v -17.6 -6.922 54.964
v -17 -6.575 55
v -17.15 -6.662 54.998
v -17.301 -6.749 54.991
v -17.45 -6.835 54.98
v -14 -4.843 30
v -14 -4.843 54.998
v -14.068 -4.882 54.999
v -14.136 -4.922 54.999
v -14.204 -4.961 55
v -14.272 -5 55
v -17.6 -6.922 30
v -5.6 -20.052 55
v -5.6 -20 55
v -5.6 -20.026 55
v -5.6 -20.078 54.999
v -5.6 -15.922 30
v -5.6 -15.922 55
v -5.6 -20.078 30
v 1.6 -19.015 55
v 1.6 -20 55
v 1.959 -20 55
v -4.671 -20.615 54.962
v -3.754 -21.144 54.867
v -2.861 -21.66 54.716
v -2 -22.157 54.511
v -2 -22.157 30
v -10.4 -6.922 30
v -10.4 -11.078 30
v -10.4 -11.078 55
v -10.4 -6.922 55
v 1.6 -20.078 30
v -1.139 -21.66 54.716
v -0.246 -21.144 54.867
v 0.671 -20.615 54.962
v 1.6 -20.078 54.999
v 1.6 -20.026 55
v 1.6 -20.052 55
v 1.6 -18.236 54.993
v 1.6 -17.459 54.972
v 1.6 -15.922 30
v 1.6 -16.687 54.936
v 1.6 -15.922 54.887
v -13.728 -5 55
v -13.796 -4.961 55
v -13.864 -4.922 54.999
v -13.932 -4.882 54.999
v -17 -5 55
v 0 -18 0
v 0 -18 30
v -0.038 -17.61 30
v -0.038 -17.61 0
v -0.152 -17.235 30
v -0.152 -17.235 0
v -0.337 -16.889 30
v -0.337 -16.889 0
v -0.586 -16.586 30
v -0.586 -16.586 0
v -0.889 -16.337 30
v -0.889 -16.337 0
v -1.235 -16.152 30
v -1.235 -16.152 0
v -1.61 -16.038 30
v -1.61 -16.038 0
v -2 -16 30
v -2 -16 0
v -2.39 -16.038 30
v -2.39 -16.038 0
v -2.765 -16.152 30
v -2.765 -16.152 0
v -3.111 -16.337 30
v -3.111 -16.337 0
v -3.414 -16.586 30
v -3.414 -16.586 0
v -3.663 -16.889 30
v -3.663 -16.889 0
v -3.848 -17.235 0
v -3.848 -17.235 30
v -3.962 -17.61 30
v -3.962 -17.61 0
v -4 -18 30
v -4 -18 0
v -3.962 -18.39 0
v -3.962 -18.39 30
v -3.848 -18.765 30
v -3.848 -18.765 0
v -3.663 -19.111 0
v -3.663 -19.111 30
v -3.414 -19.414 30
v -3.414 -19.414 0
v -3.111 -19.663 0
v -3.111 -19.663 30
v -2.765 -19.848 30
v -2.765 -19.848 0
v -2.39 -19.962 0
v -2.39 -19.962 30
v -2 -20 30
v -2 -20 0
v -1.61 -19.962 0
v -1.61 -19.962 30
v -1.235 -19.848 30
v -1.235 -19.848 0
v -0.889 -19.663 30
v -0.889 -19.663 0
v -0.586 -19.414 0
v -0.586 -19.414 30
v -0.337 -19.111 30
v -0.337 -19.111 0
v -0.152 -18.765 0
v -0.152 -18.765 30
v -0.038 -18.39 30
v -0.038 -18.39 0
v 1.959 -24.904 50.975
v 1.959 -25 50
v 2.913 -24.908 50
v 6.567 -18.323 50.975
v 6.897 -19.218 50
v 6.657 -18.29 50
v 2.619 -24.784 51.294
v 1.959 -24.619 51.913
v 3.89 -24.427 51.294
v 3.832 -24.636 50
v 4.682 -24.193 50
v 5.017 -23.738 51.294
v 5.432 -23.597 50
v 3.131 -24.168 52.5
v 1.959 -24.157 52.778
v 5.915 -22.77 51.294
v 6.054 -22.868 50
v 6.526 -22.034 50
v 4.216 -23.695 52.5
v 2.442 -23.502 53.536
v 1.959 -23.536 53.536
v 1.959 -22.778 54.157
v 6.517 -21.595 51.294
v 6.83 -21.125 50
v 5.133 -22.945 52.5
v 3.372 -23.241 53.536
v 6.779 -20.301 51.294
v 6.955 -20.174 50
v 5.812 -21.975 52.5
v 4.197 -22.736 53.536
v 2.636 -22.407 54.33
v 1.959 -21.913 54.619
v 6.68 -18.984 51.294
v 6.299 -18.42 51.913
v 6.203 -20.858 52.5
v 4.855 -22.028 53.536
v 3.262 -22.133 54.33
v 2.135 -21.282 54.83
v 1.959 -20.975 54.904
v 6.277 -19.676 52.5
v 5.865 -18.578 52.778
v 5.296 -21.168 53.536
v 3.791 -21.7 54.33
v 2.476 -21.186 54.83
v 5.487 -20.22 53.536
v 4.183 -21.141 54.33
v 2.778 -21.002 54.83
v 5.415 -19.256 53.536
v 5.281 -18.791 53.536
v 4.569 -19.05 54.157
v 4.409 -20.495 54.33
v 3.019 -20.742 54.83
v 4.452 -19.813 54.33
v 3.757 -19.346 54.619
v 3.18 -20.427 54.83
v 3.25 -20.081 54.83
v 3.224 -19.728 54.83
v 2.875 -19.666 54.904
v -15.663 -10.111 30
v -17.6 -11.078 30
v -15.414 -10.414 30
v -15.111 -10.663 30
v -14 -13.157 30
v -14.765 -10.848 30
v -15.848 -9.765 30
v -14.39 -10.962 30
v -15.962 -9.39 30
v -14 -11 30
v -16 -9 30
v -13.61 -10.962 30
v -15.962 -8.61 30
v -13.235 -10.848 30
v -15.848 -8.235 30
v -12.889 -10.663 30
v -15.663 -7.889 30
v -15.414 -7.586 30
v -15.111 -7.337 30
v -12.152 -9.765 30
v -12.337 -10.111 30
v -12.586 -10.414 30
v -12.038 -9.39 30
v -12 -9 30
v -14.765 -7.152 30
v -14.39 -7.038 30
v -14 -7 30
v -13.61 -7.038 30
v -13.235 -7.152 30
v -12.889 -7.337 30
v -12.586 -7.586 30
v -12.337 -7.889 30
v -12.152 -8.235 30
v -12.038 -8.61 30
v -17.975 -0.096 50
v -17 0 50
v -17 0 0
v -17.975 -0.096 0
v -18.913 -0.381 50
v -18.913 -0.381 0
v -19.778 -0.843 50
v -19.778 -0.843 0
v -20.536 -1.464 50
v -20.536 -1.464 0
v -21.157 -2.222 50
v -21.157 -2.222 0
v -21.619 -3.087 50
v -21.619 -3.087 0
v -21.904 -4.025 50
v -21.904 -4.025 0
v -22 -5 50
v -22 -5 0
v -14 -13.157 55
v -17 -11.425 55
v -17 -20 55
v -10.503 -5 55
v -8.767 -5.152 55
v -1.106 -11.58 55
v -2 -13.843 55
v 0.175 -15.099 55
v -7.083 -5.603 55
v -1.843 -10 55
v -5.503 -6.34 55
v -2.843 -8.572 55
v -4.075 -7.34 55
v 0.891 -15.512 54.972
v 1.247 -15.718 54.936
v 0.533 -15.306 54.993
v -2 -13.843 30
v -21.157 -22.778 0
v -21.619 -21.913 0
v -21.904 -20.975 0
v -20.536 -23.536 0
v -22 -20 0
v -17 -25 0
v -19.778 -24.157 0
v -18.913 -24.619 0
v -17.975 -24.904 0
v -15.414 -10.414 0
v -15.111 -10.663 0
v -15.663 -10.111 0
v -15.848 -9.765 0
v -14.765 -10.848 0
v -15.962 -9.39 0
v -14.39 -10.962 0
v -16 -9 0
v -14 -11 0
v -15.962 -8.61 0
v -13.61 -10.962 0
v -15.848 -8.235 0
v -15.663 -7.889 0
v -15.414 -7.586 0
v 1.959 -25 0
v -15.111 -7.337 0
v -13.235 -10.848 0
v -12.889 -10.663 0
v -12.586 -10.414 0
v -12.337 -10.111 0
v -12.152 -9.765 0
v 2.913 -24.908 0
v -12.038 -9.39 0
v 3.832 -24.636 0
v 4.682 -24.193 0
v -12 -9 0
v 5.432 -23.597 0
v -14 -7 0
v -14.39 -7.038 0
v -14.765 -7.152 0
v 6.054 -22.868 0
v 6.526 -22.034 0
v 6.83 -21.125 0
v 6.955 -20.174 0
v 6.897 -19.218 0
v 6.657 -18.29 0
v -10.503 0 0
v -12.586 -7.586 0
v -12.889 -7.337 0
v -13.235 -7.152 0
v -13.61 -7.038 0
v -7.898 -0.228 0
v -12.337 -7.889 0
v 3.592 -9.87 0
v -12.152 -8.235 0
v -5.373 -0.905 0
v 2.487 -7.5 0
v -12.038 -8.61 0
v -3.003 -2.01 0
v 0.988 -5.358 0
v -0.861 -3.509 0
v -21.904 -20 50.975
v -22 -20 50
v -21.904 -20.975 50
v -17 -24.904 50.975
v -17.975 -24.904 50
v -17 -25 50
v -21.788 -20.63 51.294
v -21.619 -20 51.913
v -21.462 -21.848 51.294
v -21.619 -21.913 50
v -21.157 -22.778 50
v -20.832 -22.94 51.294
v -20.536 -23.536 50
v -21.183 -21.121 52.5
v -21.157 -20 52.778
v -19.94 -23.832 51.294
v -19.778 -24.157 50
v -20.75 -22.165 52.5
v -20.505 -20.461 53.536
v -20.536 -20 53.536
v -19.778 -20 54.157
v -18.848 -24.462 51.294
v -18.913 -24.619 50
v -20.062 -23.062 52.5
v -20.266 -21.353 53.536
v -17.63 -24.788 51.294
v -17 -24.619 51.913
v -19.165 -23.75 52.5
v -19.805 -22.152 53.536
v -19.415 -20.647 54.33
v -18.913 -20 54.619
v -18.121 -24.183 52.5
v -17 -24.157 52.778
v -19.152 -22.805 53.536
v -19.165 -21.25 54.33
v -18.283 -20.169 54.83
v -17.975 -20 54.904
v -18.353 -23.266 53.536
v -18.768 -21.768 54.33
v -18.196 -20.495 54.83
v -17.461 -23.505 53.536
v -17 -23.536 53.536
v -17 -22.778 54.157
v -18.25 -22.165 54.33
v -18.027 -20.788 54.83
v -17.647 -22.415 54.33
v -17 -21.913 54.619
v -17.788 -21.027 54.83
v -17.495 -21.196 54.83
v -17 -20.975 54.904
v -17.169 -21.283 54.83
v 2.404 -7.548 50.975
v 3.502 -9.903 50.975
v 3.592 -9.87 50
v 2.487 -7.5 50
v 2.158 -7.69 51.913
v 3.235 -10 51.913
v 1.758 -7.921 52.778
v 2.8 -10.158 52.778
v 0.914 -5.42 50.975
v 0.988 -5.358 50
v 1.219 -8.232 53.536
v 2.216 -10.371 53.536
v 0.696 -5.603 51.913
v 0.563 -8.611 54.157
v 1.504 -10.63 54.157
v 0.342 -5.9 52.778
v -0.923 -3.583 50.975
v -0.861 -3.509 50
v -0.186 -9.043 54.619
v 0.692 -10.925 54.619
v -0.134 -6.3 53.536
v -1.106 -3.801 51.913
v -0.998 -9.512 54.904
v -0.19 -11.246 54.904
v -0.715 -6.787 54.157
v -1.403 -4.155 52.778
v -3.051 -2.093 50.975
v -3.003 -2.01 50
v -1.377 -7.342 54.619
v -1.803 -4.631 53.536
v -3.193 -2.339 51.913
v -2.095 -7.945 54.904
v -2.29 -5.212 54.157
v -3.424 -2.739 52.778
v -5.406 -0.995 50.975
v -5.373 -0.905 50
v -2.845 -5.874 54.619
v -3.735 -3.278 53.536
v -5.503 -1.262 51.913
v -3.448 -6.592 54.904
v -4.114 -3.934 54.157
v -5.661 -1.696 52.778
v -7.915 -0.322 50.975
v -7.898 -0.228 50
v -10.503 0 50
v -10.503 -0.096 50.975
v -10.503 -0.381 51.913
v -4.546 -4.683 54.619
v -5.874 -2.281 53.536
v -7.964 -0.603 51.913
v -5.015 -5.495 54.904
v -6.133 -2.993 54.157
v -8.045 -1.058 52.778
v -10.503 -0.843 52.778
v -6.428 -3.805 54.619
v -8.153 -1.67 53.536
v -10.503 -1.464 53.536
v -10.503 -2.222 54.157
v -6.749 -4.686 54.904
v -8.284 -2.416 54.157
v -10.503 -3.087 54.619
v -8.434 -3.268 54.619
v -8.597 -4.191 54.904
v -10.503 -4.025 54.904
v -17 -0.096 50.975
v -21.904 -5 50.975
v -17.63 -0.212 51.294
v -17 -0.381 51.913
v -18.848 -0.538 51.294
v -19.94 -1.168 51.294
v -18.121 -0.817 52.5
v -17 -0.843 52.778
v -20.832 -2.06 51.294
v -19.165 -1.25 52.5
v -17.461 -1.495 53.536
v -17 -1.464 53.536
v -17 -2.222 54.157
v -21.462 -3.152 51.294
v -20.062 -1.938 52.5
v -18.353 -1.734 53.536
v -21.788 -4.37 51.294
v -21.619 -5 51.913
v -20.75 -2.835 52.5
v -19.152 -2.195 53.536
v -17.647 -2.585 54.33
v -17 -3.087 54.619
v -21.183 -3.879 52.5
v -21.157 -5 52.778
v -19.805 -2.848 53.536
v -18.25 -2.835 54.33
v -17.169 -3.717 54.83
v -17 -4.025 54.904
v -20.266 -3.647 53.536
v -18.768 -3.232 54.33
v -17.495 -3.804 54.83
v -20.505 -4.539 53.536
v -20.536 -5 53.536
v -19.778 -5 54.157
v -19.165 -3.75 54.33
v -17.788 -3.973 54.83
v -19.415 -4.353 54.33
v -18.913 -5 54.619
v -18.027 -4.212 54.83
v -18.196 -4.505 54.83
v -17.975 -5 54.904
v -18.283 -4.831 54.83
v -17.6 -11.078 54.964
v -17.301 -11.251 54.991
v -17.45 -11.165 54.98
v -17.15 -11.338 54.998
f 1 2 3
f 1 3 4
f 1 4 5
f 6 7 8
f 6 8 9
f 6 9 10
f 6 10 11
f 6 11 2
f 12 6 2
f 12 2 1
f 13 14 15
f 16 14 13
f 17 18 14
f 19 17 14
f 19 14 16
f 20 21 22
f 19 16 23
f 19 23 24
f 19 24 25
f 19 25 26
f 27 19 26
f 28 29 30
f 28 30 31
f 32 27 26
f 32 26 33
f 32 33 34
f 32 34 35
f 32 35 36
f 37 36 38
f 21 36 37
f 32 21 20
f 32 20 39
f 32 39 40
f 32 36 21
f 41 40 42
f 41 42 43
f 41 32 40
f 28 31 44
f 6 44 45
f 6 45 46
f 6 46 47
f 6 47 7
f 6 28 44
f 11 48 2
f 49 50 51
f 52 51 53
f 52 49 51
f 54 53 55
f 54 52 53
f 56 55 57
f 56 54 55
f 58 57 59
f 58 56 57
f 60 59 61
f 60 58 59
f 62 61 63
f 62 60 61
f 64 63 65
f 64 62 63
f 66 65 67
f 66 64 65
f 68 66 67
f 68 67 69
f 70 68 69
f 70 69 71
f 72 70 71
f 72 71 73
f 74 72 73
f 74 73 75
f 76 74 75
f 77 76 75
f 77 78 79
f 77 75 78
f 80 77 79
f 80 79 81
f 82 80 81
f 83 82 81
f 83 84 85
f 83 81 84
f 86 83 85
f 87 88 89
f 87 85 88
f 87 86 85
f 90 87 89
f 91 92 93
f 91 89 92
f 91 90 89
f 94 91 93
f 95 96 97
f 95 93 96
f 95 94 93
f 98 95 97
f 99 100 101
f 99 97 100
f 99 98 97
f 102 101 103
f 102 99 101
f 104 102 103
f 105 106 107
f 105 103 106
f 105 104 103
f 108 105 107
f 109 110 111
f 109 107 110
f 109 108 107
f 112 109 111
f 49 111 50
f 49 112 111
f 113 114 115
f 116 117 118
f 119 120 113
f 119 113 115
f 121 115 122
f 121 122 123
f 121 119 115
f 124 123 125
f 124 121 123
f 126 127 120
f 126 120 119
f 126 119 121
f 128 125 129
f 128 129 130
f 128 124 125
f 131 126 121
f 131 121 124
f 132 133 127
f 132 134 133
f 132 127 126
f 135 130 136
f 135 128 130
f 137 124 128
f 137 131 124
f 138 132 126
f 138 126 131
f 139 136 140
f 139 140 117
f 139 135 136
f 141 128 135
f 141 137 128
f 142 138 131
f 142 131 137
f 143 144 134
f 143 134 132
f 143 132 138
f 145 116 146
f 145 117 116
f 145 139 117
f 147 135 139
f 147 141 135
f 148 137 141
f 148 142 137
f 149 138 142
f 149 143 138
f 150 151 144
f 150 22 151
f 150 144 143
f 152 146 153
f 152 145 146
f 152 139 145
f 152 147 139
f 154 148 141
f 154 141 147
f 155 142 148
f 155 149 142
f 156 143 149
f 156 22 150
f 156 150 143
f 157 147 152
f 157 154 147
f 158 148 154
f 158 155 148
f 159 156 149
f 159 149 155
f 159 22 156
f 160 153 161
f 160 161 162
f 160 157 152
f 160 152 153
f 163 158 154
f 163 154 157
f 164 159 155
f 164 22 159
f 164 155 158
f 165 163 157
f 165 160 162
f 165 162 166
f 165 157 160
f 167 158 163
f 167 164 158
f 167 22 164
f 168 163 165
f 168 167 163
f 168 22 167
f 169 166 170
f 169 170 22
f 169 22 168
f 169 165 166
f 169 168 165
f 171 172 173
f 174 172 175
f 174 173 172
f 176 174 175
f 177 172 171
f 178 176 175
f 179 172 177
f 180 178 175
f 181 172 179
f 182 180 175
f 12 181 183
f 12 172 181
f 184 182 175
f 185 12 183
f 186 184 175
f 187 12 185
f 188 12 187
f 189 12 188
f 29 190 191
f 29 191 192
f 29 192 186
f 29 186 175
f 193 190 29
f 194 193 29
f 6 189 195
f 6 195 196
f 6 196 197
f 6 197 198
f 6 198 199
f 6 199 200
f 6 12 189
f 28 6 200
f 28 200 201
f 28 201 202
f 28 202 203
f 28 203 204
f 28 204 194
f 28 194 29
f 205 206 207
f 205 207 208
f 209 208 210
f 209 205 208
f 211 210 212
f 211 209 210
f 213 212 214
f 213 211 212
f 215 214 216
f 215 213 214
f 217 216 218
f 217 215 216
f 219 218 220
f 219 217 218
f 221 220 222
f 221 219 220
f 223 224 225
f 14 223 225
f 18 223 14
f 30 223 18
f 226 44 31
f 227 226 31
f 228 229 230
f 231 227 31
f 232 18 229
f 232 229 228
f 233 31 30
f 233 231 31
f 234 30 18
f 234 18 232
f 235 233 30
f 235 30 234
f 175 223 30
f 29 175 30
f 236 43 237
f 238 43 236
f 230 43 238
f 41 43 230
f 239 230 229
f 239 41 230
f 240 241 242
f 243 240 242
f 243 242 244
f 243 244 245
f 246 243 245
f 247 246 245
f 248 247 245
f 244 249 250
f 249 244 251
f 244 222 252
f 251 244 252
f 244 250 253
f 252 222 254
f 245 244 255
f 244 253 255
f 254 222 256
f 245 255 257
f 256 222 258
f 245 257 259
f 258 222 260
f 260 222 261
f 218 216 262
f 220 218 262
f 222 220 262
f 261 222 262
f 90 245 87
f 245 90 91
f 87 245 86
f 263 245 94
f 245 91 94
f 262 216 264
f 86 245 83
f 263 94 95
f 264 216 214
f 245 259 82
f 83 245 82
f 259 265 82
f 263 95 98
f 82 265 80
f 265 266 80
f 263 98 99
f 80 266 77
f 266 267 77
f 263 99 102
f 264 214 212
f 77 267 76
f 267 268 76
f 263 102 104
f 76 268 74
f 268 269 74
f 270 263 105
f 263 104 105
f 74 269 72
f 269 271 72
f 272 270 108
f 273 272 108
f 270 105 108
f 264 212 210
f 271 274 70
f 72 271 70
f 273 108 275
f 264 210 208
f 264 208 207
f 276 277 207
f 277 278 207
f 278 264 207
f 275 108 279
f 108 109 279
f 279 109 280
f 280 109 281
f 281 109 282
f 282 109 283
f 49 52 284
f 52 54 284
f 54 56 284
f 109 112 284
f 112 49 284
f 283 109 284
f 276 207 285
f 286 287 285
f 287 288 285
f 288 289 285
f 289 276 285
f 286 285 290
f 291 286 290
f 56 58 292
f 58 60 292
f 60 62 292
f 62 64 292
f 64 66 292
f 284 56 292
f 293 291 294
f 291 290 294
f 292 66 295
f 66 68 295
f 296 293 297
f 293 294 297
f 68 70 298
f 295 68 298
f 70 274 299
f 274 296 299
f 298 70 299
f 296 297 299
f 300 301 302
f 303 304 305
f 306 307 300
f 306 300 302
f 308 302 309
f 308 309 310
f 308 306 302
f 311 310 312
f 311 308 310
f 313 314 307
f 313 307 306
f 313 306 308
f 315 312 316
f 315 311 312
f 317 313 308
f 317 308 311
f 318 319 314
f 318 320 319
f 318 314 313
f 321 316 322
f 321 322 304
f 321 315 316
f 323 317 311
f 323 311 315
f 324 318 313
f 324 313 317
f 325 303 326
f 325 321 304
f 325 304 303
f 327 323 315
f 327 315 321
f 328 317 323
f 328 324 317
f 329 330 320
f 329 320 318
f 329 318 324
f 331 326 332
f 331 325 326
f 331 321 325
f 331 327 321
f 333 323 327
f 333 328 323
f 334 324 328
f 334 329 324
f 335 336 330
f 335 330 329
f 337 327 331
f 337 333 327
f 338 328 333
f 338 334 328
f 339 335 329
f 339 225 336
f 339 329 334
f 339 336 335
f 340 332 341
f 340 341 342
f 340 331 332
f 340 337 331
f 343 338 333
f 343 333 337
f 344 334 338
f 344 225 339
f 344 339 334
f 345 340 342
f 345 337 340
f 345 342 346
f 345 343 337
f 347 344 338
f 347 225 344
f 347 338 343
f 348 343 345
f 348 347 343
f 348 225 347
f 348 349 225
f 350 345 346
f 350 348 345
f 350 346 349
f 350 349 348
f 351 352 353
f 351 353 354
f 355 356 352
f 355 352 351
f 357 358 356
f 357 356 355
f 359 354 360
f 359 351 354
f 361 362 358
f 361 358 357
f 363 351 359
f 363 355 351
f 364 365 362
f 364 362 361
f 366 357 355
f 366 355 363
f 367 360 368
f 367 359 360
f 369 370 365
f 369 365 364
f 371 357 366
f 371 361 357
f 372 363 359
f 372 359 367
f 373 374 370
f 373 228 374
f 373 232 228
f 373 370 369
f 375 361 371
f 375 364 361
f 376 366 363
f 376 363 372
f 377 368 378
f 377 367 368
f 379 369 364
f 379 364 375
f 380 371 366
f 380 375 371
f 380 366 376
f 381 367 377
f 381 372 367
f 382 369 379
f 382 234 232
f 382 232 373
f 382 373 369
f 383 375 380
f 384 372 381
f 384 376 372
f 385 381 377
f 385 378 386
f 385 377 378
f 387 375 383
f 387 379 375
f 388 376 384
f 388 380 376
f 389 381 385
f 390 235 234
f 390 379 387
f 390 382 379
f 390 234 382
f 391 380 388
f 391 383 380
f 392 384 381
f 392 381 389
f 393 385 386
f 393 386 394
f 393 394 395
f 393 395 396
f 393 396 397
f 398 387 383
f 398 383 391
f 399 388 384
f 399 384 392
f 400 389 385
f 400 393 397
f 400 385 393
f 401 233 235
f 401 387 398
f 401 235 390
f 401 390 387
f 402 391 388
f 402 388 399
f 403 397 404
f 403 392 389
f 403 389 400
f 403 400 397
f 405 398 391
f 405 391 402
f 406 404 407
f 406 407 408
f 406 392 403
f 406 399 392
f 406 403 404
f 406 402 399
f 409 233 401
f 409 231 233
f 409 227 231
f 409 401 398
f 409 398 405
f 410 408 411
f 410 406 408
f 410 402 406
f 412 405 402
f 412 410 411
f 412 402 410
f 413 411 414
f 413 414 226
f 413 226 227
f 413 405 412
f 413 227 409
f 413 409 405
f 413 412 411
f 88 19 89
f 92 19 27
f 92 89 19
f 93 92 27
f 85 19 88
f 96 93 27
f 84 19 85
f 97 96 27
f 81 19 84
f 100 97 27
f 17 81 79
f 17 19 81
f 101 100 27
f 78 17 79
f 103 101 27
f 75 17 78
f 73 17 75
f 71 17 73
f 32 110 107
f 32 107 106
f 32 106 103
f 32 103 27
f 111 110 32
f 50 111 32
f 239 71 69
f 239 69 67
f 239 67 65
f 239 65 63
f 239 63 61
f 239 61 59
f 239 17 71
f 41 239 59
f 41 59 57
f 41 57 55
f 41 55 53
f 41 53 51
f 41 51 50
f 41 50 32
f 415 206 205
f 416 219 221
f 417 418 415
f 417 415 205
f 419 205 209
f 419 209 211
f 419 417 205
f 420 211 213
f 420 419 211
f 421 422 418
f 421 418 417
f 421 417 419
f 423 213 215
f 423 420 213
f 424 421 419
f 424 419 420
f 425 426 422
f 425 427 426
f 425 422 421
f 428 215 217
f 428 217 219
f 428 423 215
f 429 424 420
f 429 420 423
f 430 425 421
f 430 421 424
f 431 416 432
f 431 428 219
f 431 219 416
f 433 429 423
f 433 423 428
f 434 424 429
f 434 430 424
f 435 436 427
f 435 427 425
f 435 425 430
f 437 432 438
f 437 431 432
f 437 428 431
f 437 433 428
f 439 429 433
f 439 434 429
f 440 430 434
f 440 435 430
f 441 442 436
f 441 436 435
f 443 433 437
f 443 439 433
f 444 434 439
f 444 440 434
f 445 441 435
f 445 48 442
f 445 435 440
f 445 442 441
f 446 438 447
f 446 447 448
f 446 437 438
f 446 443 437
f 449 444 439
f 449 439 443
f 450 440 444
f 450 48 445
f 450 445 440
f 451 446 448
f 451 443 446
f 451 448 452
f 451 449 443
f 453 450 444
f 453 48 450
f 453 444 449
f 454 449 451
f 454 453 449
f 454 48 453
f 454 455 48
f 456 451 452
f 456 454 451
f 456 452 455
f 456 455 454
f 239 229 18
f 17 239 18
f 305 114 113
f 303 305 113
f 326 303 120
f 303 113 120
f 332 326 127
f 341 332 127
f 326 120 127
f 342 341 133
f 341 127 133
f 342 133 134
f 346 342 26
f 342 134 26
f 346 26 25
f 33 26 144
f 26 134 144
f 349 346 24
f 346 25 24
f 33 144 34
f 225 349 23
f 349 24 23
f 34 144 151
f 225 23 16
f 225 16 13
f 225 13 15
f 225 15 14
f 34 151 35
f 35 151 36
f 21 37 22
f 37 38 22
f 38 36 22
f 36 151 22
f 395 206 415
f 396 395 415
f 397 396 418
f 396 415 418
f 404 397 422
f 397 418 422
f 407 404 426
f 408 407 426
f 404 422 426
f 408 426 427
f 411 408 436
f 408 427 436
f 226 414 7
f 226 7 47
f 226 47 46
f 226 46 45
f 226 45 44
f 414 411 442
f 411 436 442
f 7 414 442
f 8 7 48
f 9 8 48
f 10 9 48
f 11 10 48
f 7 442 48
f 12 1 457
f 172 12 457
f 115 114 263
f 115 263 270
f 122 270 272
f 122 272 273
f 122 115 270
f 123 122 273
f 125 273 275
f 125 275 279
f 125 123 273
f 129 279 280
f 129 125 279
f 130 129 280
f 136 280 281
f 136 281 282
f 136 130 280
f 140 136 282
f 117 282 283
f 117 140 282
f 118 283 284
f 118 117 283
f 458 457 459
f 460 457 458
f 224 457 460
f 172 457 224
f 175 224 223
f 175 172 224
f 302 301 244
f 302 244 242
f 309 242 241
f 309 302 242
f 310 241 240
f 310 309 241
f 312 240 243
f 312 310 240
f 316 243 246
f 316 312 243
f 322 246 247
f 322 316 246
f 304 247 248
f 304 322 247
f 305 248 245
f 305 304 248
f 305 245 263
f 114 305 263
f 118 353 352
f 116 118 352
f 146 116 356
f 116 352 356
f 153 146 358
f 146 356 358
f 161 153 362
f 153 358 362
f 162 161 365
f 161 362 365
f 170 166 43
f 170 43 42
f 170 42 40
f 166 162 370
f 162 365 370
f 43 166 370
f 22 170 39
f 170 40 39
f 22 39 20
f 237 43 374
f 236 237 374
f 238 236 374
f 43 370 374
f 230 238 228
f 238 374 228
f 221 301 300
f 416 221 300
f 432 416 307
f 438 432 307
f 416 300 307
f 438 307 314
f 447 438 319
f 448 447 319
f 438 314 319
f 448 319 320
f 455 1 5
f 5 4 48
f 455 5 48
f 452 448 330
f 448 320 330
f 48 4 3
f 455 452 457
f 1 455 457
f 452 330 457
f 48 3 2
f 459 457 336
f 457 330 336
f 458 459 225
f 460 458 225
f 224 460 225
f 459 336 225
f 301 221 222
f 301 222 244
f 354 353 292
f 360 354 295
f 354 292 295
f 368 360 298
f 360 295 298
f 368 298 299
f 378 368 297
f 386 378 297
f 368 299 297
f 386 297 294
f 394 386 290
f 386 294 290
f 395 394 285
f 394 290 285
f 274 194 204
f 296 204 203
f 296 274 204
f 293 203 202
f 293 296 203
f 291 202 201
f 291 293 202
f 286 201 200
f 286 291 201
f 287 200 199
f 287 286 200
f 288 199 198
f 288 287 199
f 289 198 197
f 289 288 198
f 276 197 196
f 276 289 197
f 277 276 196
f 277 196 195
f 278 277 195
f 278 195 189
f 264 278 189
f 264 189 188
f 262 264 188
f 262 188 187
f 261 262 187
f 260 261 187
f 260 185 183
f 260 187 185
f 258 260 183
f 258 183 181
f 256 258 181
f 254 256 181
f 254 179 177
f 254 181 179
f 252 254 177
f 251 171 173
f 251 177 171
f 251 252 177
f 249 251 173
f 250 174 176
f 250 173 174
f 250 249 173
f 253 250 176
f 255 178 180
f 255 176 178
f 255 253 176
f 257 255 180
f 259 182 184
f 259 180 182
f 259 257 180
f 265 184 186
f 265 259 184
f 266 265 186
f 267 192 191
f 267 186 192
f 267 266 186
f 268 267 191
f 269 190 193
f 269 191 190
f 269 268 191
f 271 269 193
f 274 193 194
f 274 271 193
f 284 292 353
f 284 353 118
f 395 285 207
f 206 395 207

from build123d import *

# Parameters (mm, degrees)
PAD_DEPTH     = 55
FILLET_R      = 5
FILLET001_R   = 5
SKETCH004_R   = 2
HOLE001_DEPTH = 55.001
POCKET_START  = 30
POCKET_DEPTH  = 70


with BuildPart() as part:
    # Sketch → Pad (new body)
    with BuildSketch(Plane.XY):
        with BuildLine():
            Line((-10.503113, 0), (-22, 0))
            Line((-22, 0), (-22, -25))
            Line((-22, -25), (9.099256, -25))
            Line((3.592276, -9.869698), (9.099256, -25))
            ThreePointArc((3.592276, -9.869698), (-1.899467, -2.712719), (-10.503113, 0))
        make_face()
    extrude(amount=PAD_DEPTH)

    # Fillet
    fillet_edges = [part.edges().sort_by_distance(p)[0] for p in [
        (9.099256, -25, 27.5),
        (-22, -25, 27.5),
        (-22, 0, 27.5),
    ]]
    fillet(fillet_edges, radius=FILLET_R)

    # Fillet001
    fillet001_edges = [part.edges().sort_by_distance(p)[0] for p in [
        (-13.751557, 0, 55),
        (-20.535534, -1.464466, 55),
        (-1.899467, -2.712719, 55),
        (-22, -12.5, 55),
        (5.124628, -14.079799, 55),
        (-20.535534, -23.535534, 55),
        (6.054276, -22.867882, 55),
        (-7.520742, -25, 55),
    ]]
    fillet(fillet001_edges, radius=FILLET001_R)

    # Sketch004 → Hole001 (cut, through all)
    with BuildSketch(Plane.XY):
        with Locations((-2, -18)):
            Circle(SKETCH004_R)
        with Locations((-14, -9)):
            Circle(SKETCH004_R)
    extrude(amount=HOLE001_DEPTH, mode=Mode.SUBTRACT)

    # Sketch005 → Pocket (cut)
    with BuildSketch(Plane.XY.offset(POCKET_START)):
        Polygon((1.6, -15.921539), (-2, -13.843078), (-5.6, -15.921539), (-5.6, -20.078461), (-2, -22.156922), (1.6, -20.078461), align=None)
        Polygon((-10.4, -6.921539), (-14, -4.843078), (-17.6, -6.921539), (-17.6, -11.078461), (-14, -13.156922), (-10.4, -11.078461), align=None)
    extrude(amount=POCKET_DEPTH, mode=Mode.SUBTRACT)


solid = part.part
